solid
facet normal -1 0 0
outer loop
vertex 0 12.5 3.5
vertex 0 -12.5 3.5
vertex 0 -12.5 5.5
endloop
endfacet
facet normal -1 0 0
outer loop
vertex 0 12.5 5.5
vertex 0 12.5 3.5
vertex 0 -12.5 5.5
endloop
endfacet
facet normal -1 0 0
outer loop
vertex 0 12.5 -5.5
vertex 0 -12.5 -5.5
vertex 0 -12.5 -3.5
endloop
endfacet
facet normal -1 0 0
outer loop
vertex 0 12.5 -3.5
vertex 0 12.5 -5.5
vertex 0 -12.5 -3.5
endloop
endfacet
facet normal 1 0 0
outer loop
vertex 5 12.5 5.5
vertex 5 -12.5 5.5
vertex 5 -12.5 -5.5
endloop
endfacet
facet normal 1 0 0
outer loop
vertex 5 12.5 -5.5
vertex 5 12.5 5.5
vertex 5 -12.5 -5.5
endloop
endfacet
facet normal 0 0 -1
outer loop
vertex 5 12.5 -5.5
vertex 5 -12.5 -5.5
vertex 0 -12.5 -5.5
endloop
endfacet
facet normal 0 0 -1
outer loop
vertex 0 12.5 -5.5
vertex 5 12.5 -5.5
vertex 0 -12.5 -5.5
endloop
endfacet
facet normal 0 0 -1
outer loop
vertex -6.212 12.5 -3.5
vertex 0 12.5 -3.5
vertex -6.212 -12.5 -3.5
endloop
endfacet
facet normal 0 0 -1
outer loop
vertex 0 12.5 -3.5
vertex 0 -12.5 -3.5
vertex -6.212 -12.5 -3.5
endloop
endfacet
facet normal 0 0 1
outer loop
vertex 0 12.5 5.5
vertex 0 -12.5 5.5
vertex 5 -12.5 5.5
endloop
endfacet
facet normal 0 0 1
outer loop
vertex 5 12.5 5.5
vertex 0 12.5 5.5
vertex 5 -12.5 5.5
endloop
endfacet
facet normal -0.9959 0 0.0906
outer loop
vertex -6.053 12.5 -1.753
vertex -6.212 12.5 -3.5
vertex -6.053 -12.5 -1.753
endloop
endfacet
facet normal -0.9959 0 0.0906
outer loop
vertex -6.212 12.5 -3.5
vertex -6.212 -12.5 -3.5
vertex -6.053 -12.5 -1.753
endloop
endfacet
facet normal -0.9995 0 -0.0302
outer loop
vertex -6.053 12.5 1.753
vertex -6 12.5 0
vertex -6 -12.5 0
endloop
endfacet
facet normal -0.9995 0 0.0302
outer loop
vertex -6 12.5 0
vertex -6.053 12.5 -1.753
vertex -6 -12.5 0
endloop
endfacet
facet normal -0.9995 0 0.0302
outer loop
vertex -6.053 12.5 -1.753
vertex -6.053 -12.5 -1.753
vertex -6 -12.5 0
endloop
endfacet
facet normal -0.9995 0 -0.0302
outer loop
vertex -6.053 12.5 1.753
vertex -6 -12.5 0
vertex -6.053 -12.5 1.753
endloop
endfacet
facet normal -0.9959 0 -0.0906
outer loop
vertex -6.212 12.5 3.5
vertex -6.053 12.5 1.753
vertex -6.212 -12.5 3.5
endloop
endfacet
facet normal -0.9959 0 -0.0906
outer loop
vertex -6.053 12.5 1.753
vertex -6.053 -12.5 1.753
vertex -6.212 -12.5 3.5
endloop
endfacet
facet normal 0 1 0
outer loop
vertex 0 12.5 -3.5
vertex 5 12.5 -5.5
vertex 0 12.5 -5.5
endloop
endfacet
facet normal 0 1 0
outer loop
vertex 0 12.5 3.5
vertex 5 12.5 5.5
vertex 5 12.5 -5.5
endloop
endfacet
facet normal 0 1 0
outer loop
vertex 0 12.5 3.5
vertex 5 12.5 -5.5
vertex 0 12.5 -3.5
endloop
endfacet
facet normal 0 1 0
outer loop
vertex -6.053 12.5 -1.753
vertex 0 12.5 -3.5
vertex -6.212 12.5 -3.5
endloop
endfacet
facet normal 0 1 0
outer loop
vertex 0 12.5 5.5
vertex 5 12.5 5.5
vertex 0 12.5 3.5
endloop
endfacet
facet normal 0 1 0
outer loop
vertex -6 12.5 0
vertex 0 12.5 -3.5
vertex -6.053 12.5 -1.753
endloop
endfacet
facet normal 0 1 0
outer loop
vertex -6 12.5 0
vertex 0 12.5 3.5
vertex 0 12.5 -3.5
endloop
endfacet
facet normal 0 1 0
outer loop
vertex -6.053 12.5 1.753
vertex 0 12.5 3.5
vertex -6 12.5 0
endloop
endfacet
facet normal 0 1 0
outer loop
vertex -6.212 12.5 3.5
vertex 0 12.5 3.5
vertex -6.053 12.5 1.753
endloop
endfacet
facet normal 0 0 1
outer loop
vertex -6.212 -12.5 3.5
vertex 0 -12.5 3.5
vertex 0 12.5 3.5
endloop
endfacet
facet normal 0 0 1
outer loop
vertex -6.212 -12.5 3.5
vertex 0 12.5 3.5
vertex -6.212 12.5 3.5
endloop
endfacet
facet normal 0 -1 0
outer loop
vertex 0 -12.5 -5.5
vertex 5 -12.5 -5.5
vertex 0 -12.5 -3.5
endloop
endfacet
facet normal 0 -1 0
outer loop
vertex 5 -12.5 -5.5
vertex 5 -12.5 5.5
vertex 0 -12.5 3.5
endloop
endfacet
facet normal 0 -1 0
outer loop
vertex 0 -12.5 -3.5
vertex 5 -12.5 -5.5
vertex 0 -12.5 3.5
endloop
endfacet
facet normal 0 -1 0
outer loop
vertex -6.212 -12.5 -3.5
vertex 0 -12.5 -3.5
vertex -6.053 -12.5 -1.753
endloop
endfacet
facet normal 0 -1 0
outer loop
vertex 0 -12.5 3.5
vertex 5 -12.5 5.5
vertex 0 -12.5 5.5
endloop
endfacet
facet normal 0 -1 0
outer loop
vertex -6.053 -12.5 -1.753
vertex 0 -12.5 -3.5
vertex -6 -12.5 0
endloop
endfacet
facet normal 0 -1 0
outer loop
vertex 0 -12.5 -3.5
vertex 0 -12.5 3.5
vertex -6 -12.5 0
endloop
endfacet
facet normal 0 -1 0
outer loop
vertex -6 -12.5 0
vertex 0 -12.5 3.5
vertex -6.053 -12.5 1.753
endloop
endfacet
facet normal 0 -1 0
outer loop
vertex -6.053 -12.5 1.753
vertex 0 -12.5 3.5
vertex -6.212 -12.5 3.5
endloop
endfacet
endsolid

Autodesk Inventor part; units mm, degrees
ref_plane "YZ Plane" through (0, 0, 0) normal (1, 0, 0) x (0, 1, 0)
ref_plane "XZ Plane" through (0, 0, 0) normal (0, 1, 0) x (-1, 0, 0)
ref_plane "XY Plane" through (0, 0, 0) normal (0, 0, 1) x (1, 0, 0)
sketch "Skizze1" plane through (0, 0, 0) normal (0, 1, 0) x (-1, 0, 0)
  line L0 (39.5556, 0) -> (-37.1227, 0) construction
  line L1 (0, 37.8779) -> (0, -33.8132) construction
  circle A0 centre (35, 0) radius 30.5
  circle A1 centre (35, 0) radius 29
  line L2 (4.7015, 3.5) -> (0, 3.5)
  line L3 (4.7015, -3.5) -> (0, -3.5)
  line L4 (0, 3.5) -> (0, -3.5)
  line L5 (0, 5.5) -> (-5, 5.5)
  line L6 (-5, 5.5) -> (-5, -5.5)
  line L7 (-5, -5.5) -> (0, -5.5)
  line L8 (0, -5.5) -> (0, 5.5)
  line L9 (4.7015, 3.5) -> (6.212, 3.5)
  line L10 (4.7015, -3.5) -> (6.212, -3.5)
  point P0 (0, 0)
  point P1 (0, 3.5)
  dimension "d0" = 61
  dimension "d1" = 35
  dimension "d2" = 1.5
  dimension "d3" = 7
  dimension "d4" = 5
  dimension "d5" = 11
extrude "Extrusion1" add sketch "Skizze1" along normal mid plane 25 contours L9 A1 L10 A0 | A0 L3 L4 L2 | L4 L8 L7 L6 L5 picked at (5.6457, 2.7231)
properties part number "duct_stift"
